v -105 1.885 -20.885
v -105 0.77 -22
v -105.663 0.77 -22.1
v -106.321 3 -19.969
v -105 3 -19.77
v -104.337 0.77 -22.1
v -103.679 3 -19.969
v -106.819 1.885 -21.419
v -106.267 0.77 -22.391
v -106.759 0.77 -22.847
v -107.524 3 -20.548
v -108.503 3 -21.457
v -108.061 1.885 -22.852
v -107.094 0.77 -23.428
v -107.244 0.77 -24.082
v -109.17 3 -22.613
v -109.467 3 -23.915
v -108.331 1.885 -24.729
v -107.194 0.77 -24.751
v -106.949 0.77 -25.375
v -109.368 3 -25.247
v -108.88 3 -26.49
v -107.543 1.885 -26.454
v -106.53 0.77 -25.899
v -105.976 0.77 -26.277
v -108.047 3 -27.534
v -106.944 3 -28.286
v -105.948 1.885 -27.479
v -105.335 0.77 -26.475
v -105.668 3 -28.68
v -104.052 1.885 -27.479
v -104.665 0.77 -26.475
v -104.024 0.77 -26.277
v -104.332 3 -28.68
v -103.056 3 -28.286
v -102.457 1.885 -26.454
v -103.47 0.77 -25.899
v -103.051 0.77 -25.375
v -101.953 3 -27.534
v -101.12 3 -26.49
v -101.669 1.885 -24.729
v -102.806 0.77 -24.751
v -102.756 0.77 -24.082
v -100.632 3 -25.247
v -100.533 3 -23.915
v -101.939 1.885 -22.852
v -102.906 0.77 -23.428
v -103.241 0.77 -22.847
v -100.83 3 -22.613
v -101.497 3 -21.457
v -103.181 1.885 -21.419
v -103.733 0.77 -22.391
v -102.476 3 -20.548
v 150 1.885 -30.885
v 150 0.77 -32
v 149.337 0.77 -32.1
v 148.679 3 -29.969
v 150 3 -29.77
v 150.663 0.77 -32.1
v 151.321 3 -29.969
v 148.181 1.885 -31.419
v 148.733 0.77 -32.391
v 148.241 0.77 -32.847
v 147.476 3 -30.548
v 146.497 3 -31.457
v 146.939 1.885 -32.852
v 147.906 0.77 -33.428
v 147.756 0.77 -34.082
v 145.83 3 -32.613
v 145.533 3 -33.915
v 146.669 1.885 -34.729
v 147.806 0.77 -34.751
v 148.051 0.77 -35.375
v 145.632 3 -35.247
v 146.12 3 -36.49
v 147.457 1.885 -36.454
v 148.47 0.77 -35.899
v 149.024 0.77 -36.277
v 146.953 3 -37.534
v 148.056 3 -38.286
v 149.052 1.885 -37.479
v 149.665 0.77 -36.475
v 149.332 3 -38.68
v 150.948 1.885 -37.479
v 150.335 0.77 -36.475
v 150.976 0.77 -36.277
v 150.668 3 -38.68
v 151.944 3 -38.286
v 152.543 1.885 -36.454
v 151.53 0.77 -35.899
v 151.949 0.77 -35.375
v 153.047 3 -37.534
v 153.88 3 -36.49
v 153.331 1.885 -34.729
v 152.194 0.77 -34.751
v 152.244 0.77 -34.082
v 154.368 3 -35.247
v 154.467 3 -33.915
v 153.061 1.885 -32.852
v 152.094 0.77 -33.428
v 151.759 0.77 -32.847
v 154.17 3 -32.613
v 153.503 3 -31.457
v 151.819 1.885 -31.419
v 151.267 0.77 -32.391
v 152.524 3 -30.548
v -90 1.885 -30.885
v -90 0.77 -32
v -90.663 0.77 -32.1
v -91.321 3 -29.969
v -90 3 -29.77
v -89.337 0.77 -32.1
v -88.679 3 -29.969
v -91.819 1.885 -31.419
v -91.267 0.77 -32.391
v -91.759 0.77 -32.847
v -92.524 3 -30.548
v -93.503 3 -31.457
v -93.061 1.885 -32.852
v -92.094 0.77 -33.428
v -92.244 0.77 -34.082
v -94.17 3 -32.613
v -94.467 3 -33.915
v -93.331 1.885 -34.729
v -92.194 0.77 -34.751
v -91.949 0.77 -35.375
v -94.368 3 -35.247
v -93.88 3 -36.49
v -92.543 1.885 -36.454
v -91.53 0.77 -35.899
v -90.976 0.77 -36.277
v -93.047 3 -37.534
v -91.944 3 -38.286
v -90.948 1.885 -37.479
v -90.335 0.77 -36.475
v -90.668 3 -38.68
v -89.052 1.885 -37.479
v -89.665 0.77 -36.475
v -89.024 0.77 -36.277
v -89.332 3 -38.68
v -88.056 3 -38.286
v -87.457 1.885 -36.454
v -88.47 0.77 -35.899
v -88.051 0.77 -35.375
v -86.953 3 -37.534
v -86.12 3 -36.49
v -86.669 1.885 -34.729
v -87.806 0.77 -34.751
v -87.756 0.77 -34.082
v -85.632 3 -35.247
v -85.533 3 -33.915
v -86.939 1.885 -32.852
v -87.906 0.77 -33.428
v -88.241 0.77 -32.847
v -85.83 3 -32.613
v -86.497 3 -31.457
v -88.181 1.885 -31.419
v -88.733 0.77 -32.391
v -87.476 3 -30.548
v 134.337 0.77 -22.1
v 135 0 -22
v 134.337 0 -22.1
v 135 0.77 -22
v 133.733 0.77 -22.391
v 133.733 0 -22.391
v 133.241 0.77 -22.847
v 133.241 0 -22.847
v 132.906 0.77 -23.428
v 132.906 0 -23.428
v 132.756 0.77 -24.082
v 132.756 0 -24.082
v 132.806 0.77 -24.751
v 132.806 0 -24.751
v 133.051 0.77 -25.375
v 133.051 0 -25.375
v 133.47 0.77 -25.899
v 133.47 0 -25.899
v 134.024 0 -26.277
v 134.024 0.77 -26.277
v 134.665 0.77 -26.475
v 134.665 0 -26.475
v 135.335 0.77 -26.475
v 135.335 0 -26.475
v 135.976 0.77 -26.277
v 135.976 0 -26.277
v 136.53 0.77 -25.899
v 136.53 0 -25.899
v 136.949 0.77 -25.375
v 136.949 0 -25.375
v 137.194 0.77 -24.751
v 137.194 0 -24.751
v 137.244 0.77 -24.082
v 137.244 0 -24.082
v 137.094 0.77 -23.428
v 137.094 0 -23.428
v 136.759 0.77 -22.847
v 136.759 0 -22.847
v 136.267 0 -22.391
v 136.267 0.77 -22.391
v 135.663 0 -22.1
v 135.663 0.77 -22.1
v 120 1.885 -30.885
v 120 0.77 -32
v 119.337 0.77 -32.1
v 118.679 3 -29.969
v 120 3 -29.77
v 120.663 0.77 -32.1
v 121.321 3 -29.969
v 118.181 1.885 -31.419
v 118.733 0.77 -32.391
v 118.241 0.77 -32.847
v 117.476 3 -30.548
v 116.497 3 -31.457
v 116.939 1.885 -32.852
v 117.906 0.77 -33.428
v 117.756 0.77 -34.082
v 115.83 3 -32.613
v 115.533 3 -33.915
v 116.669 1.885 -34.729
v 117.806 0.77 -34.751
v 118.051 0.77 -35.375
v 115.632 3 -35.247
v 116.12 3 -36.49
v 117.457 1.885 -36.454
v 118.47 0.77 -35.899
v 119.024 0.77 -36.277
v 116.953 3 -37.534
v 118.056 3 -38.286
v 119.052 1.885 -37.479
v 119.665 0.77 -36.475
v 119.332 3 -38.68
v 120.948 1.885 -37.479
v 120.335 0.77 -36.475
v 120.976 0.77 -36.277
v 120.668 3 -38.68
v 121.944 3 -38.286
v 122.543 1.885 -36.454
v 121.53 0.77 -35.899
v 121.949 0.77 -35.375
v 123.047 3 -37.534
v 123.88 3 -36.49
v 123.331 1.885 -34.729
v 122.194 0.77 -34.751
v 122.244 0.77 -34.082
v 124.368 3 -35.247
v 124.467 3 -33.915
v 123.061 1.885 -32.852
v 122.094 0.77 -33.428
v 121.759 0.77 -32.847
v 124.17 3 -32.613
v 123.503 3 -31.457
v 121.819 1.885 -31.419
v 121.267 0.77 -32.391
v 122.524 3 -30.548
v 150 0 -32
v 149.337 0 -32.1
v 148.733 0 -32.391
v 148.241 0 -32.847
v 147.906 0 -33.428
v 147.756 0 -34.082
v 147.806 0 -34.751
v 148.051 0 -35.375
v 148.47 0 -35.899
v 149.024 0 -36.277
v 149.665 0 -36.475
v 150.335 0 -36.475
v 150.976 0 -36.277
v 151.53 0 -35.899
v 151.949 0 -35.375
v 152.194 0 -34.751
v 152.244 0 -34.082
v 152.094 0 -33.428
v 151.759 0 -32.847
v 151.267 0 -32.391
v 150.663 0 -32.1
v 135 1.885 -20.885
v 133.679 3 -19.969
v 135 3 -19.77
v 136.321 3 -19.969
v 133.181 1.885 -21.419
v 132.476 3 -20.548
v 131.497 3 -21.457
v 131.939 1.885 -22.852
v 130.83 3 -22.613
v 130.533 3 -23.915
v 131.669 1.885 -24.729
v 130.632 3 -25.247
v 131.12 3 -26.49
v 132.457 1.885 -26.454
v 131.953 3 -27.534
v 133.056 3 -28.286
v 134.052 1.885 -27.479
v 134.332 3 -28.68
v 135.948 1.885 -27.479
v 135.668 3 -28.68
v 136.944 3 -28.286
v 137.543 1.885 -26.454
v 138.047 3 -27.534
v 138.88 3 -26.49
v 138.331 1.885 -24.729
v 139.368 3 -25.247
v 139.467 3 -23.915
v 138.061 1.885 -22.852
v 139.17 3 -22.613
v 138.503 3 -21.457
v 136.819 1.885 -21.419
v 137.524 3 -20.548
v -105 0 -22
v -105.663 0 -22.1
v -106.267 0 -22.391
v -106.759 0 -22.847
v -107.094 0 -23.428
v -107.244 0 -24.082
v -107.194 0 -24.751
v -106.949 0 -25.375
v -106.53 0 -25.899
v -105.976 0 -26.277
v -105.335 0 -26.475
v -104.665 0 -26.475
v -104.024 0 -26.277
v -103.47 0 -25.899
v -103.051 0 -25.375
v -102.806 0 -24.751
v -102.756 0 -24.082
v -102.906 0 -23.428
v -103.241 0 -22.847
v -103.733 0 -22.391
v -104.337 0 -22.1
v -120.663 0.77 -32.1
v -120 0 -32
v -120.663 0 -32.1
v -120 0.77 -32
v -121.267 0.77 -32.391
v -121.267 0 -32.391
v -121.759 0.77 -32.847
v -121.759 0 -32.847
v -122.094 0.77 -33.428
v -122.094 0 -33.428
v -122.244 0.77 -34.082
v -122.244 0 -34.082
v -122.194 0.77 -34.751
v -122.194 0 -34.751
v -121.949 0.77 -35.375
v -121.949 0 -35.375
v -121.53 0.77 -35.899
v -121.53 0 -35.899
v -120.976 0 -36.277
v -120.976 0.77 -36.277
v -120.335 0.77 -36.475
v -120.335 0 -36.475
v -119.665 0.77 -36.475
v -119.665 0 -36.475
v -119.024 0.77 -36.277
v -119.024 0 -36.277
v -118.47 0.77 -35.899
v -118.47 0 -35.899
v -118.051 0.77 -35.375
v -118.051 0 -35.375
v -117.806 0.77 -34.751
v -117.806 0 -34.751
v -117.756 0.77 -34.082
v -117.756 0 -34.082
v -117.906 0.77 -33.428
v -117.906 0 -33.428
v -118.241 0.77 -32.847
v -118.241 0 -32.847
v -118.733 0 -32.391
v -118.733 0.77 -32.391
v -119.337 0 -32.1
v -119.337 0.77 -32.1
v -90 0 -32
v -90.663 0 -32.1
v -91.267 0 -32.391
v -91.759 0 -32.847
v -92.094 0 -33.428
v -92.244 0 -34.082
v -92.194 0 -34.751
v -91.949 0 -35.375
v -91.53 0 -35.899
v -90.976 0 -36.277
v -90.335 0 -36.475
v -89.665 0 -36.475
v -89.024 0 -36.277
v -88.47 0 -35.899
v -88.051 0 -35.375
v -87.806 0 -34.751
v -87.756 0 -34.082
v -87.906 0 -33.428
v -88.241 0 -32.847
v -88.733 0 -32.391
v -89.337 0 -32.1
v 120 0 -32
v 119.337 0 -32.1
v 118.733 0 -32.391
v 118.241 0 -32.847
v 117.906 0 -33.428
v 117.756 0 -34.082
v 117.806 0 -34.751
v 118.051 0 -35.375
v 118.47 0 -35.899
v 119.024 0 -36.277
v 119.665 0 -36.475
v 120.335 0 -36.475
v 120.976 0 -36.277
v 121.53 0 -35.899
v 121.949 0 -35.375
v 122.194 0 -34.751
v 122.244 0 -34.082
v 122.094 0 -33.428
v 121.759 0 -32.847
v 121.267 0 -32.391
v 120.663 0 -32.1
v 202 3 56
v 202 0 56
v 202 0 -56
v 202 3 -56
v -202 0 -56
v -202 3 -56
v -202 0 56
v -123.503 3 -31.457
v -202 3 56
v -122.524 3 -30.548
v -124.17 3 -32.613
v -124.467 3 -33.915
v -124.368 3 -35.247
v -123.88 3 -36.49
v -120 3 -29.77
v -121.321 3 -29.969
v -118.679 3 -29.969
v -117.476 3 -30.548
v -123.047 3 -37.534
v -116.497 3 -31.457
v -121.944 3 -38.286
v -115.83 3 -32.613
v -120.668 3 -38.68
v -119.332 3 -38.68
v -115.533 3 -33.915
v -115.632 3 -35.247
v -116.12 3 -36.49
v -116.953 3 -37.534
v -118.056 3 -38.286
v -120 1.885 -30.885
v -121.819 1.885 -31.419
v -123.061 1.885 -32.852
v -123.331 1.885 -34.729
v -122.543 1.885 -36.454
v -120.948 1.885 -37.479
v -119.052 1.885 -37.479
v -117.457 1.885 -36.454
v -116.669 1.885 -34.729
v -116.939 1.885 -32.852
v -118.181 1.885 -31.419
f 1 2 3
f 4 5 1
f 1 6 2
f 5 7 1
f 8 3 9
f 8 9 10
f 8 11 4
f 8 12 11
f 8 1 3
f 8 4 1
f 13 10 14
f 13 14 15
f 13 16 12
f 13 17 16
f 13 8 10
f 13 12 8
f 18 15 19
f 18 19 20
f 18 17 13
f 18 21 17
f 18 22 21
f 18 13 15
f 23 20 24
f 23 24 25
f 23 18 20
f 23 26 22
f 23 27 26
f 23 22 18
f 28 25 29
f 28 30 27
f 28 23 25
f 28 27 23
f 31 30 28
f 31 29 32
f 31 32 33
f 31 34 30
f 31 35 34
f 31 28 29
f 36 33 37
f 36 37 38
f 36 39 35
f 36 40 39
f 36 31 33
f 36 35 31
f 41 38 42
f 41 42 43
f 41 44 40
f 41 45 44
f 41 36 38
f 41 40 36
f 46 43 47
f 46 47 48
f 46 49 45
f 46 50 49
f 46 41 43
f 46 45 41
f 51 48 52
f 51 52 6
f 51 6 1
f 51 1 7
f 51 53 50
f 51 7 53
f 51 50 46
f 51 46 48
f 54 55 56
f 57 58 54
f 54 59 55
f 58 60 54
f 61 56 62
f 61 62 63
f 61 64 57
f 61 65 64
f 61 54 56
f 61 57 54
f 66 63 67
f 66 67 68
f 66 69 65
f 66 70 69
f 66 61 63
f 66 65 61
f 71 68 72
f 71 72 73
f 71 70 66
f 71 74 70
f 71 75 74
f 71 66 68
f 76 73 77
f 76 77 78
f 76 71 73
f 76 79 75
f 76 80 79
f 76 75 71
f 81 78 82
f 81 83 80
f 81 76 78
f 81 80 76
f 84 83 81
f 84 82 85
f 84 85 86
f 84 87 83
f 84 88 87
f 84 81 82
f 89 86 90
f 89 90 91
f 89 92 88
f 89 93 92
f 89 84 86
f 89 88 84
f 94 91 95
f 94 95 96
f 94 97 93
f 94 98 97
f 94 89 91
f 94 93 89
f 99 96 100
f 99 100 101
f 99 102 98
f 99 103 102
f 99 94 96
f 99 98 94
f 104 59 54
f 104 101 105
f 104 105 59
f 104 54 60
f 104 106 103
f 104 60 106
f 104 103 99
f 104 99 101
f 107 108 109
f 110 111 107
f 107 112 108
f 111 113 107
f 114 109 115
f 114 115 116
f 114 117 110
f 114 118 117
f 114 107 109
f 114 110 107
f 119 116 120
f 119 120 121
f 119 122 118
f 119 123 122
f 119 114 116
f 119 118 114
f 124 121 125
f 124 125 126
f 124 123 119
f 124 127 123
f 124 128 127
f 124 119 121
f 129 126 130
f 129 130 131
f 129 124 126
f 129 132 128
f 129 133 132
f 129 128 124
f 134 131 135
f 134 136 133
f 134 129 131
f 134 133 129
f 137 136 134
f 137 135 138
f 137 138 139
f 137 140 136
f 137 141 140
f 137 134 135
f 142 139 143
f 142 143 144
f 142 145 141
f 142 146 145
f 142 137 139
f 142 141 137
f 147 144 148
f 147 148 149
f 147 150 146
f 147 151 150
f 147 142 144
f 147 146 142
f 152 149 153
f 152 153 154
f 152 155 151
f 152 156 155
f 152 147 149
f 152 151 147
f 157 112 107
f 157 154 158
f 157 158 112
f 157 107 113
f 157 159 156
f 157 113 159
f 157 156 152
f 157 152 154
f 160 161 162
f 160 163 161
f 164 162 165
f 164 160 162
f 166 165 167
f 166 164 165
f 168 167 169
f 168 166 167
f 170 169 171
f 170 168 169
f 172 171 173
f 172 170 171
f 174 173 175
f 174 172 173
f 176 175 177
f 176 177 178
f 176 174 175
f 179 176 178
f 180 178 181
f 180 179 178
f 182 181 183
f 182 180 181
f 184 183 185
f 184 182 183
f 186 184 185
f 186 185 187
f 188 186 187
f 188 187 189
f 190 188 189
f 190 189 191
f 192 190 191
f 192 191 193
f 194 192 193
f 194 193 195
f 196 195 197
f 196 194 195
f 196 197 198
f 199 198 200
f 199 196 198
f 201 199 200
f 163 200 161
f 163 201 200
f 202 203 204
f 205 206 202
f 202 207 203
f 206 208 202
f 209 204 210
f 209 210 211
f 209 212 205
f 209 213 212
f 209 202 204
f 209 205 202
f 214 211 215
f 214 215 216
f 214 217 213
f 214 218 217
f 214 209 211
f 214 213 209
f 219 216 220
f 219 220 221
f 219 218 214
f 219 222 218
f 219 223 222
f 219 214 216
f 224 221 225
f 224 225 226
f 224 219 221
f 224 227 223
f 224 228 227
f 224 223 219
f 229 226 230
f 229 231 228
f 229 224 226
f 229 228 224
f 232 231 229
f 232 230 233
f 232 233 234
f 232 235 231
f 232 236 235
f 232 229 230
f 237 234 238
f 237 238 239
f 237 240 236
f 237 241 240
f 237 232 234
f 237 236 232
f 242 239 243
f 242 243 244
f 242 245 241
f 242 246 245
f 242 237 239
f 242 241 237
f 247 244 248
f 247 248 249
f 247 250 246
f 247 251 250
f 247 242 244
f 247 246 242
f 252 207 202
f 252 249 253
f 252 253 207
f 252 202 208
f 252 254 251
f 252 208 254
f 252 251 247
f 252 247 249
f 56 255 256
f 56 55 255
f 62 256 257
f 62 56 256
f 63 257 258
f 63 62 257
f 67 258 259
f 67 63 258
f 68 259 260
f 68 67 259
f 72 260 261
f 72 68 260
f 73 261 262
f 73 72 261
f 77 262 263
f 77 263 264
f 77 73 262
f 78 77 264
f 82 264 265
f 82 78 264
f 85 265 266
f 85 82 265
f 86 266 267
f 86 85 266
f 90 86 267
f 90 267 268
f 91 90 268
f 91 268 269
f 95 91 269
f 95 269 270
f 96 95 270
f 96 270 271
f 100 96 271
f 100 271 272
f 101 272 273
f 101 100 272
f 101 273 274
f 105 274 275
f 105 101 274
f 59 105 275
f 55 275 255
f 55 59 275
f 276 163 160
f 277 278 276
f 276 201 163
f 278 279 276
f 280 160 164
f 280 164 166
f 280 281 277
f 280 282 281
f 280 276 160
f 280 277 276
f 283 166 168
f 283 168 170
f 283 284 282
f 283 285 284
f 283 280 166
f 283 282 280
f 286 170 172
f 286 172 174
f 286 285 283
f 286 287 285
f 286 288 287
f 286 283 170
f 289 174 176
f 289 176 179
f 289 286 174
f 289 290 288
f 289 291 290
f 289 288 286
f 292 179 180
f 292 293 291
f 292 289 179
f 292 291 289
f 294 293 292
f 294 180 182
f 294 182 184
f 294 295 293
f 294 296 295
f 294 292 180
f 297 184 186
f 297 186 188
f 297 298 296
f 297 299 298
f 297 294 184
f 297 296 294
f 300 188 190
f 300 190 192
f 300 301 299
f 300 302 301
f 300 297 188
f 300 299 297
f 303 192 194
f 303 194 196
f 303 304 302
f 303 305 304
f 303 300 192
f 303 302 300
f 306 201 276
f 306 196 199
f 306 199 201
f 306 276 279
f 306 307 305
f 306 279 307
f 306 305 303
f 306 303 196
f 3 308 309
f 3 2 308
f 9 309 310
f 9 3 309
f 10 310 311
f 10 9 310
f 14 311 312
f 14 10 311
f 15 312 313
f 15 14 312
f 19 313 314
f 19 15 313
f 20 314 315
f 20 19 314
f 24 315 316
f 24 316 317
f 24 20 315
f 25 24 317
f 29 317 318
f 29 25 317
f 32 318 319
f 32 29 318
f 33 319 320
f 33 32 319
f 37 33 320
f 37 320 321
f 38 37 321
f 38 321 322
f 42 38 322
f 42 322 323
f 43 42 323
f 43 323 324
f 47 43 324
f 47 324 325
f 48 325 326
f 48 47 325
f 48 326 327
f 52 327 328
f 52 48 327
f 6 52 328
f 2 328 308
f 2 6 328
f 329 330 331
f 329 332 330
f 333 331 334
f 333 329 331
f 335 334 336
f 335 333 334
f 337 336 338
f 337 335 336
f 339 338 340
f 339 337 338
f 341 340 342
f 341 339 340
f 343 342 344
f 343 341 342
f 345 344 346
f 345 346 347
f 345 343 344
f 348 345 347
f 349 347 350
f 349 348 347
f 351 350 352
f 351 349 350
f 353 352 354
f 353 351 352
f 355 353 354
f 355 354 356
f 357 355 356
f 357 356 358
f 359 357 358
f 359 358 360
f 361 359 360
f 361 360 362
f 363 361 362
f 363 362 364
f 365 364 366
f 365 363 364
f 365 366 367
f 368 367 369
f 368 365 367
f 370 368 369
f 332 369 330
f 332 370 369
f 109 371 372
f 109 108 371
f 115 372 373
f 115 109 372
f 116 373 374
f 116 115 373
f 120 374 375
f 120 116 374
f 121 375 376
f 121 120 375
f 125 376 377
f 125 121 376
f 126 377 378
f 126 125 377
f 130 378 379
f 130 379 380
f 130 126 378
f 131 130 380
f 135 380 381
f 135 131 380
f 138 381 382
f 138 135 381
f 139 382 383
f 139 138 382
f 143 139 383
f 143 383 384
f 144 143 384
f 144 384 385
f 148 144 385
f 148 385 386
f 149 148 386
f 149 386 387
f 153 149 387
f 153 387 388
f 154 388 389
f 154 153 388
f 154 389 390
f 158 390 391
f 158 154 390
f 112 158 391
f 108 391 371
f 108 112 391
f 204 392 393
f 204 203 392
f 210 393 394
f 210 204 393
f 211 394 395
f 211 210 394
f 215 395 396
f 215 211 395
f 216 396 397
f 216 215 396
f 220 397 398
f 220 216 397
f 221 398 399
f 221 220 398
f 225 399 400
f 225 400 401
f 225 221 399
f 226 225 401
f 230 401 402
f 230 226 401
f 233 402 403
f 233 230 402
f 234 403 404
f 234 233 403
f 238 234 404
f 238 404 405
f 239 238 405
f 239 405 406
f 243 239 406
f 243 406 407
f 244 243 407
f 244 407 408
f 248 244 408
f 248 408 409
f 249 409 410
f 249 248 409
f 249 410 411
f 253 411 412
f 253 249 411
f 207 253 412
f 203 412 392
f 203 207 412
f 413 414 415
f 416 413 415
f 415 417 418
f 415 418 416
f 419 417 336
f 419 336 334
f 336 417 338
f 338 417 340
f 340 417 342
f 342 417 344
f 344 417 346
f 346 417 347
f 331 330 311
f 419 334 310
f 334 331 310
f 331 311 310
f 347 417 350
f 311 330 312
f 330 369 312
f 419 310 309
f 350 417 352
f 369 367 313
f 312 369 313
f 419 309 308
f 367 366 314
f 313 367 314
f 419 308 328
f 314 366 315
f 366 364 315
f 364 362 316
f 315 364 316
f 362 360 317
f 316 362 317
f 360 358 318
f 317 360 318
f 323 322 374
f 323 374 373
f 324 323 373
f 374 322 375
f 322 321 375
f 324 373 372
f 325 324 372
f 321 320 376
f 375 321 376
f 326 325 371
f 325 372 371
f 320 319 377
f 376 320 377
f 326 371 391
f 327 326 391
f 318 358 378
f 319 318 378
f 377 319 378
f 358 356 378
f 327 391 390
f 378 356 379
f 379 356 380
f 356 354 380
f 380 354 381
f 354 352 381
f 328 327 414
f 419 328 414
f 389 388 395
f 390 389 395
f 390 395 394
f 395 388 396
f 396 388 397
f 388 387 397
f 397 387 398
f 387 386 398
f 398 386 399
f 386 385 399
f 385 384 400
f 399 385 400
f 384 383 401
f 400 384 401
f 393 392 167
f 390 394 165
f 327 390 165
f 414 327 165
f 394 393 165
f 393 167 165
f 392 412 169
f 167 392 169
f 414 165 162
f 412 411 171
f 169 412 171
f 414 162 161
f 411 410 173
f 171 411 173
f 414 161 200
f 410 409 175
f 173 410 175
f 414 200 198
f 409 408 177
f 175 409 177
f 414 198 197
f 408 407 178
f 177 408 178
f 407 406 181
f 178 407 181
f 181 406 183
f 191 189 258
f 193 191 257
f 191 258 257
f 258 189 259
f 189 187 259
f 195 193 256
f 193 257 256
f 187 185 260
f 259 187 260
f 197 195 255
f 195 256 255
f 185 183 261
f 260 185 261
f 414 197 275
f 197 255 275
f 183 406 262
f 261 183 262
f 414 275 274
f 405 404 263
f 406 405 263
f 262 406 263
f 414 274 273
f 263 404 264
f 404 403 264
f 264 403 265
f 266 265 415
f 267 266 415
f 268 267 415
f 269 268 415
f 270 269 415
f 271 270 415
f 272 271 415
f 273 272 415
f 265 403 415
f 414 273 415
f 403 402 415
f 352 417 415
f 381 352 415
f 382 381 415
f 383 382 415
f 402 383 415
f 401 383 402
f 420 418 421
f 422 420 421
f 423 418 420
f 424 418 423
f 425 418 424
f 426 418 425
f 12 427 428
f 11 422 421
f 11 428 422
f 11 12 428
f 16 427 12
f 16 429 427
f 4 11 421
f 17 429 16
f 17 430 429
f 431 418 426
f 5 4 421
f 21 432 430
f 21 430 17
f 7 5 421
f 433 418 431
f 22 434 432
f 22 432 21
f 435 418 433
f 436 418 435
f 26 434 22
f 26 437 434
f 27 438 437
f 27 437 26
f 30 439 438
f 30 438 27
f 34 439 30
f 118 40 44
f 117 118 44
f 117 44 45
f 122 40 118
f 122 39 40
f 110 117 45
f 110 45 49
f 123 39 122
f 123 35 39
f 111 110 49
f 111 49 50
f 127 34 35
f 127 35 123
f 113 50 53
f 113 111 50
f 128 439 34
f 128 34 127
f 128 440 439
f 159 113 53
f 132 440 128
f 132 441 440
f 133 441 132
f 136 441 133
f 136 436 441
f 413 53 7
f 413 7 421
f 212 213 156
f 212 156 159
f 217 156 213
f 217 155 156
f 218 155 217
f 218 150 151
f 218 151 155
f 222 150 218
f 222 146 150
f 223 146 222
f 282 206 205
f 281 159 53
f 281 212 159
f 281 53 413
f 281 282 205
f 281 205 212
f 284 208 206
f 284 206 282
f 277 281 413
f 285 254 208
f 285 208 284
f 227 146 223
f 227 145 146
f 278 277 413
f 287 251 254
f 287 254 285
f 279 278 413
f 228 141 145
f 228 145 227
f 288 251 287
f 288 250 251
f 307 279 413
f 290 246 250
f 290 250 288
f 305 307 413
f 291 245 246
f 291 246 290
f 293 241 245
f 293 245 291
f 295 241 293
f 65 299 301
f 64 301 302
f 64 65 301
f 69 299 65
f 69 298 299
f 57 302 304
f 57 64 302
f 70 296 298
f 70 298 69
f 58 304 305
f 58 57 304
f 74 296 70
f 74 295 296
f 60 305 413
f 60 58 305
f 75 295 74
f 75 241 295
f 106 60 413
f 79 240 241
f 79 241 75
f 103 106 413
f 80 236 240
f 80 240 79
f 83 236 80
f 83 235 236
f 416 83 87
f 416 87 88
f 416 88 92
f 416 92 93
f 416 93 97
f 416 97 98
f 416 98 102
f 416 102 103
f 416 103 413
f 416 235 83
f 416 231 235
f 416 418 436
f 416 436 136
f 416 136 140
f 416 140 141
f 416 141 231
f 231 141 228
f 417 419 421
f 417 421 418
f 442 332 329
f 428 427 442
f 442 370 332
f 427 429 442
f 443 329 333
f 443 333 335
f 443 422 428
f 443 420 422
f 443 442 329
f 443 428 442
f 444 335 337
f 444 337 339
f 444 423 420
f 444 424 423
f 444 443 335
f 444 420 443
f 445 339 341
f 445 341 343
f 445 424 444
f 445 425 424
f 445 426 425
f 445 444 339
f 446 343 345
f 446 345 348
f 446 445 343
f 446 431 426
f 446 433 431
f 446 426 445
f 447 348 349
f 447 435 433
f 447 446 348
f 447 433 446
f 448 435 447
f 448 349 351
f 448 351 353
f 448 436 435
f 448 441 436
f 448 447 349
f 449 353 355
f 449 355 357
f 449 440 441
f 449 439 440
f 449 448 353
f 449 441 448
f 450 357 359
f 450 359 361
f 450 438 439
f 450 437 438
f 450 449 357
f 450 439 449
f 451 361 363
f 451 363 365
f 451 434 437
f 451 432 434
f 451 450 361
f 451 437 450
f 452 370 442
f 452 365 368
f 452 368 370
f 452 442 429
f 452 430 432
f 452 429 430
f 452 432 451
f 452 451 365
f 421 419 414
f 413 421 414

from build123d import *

# Parameters (mm, degrees)
SKETCH1_W                    = 404
SKETCH1_H                    = 112
BOSS_EXTRUDE1_DEPTH          = 3
CSK_FOR_M4_SFHCS1_AT_2_COUNT = 2
CSK_FOR_M4_SFHCS1_AT_2_PITCH = 30
CSK_FOR_M4_SFHCS1_AT_3_COUNT = 2
CSK_FOR_M4_SFHCS1_AT_3_PITCH = 18.027756377
LPATTERN1_COUNT              = 2
LPATTERN1_PITCH              = 240


with BuildPart() as part:
    # Sketch1 → Boss-Extrude1 (new body)
    with BuildSketch(Plane(origin=(0, 0, 0), x_dir=(1, 0, 0), z_dir=(0, 1, 0))):
        Rectangle(SKETCH1_W, SKETCH1_H)
    extrude(amount=BOSS_EXTRUDE1_DEPTH)

    # Sketch3 → CSK for M4 SFHCS1 (revolve, cut)
    with BuildSketch(Plane(origin=(120, 3, -34.25), x_dir=(0, 0, 1), z_dir=(1, 0, 0))):
        Polygon((0, 0), (0, 3), (2.25, 3), (2.25, 2.23), (4.48, 0), align=None)
    csk_for_m4_sfhcs1 = revolve(axis=Axis((120, 9.35, -34.25), (0, -1, 0)), mode=Mode.SUBTRACT)

    # CSK for M4 SFHCS1 at 2: CSK for M4 SFHCS1 ×2
    with Locations(*[(i * CSK_FOR_M4_SFHCS1_AT_2_PITCH, 0, 0) for i in range(1, CSK_FOR_M4_SFHCS1_AT_2_COUNT)]):
        add(csk_for_m4_sfhcs1, mode=Mode.SUBTRACT)

    # CSK for M4 SFHCS1 at 3: CSK for M4 SFHCS1 ×2
    with Locations(*[Vector(0.832050294337843, 0, 0.55470019622523) * (i * CSK_FOR_M4_SFHCS1_AT_3_PITCH) for i in range(1, CSK_FOR_M4_SFHCS1_AT_3_COUNT)]):
        add(csk_for_m4_sfhcs1, mode=Mode.SUBTRACT)

    # LPattern1: CSK for M4 SFHCS1 ×2
    with Locations(*[(-i * LPATTERN1_PITCH, 0, 0) for i in range(1, LPATTERN1_COUNT)]):
        add(csk_for_m4_sfhcs1, mode=Mode.SUBTRACT)

    # LPattern1 copy 1 sketch → LPattern1 copy 1 (revolve, cut)
    with BuildSketch(Plane(origin=(-90, 3, -34.25), x_dir=(0, 0, 1), z_dir=(1, 0, 0))):
        Polygon((0, 0), (0, 3), (2.25, 3), (2.25, 2.23), (4.48, 0), align=None)
    revolve(axis=Axis((-90, 9.35, -34.25), (0, -1, 0)), mode=Mode.SUBTRACT)

    # LPattern1 copy 2 sketch → LPattern1 copy 2 (revolve, cut)
    with BuildSketch(Plane(origin=(-105, 3, -24.25), x_dir=(0, 0, 1), z_dir=(1, 0, 0))):
        Polygon((0, 0), (0, 3), (2.25, 3), (2.25, 2.23), (4.48, 0), align=None)
    revolve(axis=Axis((-105, 9.35, -24.25), (0, -1, 0)), mode=Mode.SUBTRACT)


solid = part.part
